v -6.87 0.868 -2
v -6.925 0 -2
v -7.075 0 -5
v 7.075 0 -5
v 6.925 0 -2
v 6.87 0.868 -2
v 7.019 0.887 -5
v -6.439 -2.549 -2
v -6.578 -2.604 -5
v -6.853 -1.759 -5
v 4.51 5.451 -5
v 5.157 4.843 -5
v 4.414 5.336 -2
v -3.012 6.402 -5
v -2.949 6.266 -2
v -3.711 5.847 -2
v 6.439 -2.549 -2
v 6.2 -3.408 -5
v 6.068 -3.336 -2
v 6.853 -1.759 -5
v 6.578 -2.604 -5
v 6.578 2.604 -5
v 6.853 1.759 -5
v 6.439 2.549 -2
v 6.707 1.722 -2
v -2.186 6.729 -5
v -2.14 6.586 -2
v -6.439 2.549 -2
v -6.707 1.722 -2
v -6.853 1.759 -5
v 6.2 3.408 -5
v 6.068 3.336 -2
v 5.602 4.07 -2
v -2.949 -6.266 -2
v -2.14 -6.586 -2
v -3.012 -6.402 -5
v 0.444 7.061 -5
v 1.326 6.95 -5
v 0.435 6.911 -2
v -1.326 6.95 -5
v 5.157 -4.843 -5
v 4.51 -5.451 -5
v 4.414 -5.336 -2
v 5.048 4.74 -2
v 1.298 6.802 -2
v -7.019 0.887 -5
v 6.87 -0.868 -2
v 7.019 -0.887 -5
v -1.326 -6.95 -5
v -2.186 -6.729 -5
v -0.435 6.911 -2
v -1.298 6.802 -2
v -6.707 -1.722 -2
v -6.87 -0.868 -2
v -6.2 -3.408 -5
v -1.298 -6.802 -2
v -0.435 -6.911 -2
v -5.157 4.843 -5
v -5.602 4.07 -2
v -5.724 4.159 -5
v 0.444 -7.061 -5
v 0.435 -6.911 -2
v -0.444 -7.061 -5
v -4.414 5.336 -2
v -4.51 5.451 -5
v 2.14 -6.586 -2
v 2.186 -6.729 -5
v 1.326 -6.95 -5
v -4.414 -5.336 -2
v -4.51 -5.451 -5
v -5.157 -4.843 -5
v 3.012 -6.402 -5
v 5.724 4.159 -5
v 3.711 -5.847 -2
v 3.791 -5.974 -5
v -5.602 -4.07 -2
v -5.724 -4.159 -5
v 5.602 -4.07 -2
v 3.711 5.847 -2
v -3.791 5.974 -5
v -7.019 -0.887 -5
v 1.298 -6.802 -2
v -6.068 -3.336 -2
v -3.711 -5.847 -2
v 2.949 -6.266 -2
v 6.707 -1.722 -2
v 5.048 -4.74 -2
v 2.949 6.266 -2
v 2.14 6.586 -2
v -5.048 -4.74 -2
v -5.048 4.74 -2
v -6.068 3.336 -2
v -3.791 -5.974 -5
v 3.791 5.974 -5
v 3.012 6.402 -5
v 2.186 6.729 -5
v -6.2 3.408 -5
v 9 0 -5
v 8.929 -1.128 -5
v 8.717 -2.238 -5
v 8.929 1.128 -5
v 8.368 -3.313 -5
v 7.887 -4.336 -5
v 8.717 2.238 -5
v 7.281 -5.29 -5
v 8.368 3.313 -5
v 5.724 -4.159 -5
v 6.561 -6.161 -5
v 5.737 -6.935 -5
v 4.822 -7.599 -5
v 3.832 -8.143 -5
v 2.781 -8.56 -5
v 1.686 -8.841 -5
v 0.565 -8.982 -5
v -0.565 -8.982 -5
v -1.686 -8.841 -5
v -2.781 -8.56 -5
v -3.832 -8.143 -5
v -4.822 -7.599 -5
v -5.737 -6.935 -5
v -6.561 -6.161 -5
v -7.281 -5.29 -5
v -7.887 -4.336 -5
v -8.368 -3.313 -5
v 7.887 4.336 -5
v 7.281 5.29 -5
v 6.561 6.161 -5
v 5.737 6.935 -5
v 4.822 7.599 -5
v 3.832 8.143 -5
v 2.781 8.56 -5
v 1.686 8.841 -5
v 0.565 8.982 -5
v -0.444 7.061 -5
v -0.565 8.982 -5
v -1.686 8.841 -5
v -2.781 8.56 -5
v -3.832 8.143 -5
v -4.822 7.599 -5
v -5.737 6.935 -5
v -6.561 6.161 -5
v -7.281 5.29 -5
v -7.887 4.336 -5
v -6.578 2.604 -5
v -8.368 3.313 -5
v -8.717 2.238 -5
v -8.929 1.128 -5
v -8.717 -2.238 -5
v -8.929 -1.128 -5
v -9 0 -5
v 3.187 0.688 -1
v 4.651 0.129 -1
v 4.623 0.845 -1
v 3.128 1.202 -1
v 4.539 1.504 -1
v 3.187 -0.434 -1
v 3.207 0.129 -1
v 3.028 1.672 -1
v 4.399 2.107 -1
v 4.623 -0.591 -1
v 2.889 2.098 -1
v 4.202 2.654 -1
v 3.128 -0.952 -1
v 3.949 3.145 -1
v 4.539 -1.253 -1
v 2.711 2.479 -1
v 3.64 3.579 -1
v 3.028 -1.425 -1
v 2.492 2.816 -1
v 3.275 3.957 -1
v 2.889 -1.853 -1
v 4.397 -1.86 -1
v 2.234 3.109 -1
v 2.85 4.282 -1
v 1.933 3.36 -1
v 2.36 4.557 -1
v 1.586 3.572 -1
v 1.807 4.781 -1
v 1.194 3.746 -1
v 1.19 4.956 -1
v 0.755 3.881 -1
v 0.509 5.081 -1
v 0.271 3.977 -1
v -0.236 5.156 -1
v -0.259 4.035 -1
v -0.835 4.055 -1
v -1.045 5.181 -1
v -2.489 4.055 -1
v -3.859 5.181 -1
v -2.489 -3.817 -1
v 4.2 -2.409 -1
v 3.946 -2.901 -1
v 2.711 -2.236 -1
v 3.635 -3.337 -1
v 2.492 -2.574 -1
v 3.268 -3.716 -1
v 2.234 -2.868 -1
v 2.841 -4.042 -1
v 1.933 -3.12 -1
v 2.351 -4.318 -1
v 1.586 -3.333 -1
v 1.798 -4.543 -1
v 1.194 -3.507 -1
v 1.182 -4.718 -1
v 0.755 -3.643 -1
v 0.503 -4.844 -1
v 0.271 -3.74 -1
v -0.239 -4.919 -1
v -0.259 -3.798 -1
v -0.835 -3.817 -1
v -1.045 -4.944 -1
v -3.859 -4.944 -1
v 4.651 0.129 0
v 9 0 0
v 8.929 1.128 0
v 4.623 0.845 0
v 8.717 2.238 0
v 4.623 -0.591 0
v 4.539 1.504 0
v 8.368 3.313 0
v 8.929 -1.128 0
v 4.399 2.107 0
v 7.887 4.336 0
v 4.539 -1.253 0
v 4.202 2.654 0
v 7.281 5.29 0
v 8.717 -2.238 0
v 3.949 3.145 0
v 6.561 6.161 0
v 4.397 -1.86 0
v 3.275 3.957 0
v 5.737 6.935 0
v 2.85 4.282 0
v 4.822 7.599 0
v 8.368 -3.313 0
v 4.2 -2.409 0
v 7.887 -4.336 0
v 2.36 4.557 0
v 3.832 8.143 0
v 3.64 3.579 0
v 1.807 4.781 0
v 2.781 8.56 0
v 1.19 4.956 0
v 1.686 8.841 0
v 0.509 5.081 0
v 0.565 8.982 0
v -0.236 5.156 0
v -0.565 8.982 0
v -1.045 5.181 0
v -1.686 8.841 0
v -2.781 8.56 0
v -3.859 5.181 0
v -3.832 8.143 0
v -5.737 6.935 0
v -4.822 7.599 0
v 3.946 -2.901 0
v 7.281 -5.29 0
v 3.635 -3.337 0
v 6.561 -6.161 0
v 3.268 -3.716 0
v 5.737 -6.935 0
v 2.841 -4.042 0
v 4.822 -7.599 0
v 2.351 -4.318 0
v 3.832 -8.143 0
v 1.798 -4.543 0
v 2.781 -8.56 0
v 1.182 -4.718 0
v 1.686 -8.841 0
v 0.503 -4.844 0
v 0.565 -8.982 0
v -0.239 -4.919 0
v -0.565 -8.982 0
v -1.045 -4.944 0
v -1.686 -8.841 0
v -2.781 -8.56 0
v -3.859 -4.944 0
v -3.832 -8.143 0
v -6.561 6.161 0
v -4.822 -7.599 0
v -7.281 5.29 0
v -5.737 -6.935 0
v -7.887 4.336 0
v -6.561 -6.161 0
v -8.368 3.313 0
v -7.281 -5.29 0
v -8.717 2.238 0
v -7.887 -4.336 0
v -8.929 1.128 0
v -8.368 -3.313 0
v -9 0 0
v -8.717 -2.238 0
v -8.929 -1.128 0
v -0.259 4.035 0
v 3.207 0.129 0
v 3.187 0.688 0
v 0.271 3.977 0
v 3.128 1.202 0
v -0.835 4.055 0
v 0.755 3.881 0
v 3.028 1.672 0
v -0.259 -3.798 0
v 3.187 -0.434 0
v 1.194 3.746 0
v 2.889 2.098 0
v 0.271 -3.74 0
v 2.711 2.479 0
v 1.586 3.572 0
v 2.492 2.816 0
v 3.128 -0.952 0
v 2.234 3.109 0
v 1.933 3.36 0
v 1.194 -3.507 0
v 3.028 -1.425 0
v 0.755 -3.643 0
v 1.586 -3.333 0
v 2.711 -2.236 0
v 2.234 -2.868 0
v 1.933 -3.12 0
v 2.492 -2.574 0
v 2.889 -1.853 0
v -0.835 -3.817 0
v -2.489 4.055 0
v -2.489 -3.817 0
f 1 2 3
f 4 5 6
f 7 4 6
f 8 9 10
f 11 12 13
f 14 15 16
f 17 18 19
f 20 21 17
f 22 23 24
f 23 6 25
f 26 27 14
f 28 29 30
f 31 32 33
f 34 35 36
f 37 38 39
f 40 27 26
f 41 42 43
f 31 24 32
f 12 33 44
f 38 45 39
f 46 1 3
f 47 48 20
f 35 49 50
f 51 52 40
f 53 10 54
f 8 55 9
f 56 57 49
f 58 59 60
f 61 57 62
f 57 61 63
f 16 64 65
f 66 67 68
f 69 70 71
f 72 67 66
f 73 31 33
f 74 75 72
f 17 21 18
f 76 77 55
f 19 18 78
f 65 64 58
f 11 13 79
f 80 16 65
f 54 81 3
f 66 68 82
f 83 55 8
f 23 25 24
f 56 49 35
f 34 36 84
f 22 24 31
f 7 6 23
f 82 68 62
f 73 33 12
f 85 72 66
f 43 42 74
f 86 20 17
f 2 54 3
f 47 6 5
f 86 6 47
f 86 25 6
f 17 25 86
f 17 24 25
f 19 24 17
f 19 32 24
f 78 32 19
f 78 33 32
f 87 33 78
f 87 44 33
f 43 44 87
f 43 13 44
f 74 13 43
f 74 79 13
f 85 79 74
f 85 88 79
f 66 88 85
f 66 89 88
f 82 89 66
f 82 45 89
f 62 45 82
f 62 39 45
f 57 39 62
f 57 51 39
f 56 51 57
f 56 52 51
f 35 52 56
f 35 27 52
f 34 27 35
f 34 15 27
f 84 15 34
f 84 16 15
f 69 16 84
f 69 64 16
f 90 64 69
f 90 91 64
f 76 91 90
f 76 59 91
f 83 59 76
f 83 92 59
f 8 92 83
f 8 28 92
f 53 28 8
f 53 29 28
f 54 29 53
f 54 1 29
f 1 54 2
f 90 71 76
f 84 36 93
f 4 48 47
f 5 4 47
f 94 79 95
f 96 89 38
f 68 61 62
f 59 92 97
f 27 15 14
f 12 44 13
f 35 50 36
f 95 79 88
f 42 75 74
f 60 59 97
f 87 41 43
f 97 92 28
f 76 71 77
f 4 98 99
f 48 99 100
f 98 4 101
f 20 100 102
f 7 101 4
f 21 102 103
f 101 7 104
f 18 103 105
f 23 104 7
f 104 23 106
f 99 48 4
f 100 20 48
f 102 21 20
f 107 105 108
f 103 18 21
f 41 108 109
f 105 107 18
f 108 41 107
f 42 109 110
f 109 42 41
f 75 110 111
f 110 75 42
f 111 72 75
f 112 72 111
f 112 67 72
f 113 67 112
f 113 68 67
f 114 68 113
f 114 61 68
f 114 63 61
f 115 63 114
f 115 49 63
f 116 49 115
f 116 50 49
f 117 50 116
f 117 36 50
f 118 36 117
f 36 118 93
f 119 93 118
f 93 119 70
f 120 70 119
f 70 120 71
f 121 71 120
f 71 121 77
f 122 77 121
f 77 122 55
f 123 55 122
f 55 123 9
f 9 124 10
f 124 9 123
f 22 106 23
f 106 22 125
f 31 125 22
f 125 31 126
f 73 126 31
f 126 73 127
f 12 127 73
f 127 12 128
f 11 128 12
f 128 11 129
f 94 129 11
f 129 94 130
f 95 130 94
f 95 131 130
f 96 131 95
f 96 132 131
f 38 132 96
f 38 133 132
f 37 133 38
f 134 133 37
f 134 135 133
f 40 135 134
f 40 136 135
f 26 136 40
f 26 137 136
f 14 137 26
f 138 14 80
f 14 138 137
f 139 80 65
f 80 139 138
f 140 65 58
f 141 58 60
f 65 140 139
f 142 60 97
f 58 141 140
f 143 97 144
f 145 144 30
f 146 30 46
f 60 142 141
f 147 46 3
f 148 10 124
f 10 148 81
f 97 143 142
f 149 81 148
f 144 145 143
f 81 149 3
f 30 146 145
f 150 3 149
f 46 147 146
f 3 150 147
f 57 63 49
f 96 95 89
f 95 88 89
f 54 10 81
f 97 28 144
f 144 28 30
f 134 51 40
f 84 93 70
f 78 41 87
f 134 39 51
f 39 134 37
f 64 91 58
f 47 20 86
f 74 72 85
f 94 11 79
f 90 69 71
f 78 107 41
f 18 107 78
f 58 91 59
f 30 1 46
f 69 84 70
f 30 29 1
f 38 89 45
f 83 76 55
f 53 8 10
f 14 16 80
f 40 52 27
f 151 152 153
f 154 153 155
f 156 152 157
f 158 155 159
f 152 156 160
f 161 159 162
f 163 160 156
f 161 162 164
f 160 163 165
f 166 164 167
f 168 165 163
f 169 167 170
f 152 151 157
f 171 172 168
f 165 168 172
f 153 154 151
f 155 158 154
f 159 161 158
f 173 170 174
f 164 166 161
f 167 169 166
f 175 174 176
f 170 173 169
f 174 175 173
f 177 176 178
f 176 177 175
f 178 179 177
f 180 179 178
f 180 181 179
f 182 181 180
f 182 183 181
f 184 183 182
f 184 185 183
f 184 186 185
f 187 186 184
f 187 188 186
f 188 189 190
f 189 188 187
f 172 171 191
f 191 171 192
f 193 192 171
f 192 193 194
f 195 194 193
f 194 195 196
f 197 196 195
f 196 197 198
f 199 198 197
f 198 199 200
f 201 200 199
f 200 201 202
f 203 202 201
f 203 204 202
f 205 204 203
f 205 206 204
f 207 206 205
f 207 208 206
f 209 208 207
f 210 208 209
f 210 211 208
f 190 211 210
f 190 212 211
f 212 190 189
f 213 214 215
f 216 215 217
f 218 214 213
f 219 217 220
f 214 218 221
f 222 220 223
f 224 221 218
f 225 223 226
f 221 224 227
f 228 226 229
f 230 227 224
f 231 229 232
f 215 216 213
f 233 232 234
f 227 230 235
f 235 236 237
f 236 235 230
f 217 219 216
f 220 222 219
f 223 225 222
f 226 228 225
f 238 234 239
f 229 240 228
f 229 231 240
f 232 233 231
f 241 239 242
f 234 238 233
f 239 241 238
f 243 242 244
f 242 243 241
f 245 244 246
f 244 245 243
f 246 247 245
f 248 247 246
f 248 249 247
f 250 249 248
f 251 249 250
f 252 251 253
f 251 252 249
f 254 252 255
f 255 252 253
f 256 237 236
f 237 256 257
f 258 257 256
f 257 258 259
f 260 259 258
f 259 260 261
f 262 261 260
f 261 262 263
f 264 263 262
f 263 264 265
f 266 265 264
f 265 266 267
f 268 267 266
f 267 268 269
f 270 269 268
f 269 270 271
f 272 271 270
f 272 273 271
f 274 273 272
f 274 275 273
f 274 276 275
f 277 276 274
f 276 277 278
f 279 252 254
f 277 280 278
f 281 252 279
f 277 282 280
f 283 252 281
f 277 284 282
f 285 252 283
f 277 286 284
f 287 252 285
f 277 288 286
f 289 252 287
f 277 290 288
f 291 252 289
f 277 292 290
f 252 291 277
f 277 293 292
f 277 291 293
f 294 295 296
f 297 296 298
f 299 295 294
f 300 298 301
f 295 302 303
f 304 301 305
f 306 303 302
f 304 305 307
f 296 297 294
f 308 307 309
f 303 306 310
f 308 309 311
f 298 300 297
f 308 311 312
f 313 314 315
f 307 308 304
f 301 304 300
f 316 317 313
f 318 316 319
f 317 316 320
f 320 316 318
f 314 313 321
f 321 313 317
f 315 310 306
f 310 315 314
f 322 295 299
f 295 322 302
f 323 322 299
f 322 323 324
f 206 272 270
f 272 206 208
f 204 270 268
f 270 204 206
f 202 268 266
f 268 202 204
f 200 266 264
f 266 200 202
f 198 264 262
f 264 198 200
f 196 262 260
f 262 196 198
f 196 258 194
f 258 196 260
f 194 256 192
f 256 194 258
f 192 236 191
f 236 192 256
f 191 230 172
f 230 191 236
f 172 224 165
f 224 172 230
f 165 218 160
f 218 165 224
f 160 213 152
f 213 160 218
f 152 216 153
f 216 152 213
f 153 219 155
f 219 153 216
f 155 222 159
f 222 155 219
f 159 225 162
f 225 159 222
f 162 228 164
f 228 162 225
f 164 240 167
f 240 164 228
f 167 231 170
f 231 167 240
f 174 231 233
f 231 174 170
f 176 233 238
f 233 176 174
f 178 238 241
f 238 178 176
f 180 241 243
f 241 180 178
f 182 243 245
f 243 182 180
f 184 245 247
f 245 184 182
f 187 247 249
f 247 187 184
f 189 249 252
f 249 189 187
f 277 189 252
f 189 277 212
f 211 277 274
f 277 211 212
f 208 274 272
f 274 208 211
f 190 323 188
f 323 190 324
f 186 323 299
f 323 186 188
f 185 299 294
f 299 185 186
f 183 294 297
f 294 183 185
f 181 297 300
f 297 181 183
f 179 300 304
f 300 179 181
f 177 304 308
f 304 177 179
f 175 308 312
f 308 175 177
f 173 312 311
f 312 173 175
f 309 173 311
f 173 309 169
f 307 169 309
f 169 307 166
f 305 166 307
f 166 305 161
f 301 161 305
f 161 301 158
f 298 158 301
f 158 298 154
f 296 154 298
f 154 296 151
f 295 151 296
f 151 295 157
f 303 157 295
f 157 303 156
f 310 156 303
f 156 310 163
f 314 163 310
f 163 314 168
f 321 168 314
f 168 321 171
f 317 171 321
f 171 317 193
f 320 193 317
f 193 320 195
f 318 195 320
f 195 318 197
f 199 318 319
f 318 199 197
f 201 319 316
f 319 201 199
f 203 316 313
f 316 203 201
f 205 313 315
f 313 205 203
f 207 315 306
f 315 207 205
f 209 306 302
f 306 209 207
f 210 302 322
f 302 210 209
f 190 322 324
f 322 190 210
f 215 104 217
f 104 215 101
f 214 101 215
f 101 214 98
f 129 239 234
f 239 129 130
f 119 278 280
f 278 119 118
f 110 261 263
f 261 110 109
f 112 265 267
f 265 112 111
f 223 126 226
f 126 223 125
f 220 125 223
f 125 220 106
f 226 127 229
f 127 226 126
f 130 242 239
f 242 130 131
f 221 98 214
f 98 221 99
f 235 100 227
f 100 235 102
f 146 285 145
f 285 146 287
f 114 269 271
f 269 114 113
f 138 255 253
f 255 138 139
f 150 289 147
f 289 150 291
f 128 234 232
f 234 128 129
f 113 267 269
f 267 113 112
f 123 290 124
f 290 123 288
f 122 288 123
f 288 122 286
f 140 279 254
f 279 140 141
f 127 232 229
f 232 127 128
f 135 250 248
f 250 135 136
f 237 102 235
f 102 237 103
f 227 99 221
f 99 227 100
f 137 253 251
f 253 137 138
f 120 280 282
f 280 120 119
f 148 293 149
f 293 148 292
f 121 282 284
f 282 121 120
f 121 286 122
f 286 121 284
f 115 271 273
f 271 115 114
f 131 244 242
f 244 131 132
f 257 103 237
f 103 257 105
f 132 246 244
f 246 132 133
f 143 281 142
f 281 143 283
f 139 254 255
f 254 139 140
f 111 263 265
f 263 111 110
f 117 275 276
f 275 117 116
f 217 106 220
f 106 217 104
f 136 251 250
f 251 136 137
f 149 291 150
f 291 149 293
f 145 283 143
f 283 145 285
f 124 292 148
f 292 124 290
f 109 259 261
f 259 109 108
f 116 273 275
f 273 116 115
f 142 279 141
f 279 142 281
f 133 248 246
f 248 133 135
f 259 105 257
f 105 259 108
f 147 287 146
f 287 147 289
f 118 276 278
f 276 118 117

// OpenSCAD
$fn = 50;


difference() {
	union() {
		translate(v = [0, 0, -5.0000000000]) {
			cylinder(h = 5, r = 9.0000000000);
		}
	}
	union() {
		#translate(v = [0, 0, -5.0000000000]) {
			cylinder(h = 3, r1 = 7.0750000000, r2 = 6.9250000000);
		}
		translate(v = [0, 0, -1]) {
			linear_extrude(height = 1) {
				text(font = "Impact", halign = "center", size = 10, text = "D", valign = "center");
			}
		}
	}
}
